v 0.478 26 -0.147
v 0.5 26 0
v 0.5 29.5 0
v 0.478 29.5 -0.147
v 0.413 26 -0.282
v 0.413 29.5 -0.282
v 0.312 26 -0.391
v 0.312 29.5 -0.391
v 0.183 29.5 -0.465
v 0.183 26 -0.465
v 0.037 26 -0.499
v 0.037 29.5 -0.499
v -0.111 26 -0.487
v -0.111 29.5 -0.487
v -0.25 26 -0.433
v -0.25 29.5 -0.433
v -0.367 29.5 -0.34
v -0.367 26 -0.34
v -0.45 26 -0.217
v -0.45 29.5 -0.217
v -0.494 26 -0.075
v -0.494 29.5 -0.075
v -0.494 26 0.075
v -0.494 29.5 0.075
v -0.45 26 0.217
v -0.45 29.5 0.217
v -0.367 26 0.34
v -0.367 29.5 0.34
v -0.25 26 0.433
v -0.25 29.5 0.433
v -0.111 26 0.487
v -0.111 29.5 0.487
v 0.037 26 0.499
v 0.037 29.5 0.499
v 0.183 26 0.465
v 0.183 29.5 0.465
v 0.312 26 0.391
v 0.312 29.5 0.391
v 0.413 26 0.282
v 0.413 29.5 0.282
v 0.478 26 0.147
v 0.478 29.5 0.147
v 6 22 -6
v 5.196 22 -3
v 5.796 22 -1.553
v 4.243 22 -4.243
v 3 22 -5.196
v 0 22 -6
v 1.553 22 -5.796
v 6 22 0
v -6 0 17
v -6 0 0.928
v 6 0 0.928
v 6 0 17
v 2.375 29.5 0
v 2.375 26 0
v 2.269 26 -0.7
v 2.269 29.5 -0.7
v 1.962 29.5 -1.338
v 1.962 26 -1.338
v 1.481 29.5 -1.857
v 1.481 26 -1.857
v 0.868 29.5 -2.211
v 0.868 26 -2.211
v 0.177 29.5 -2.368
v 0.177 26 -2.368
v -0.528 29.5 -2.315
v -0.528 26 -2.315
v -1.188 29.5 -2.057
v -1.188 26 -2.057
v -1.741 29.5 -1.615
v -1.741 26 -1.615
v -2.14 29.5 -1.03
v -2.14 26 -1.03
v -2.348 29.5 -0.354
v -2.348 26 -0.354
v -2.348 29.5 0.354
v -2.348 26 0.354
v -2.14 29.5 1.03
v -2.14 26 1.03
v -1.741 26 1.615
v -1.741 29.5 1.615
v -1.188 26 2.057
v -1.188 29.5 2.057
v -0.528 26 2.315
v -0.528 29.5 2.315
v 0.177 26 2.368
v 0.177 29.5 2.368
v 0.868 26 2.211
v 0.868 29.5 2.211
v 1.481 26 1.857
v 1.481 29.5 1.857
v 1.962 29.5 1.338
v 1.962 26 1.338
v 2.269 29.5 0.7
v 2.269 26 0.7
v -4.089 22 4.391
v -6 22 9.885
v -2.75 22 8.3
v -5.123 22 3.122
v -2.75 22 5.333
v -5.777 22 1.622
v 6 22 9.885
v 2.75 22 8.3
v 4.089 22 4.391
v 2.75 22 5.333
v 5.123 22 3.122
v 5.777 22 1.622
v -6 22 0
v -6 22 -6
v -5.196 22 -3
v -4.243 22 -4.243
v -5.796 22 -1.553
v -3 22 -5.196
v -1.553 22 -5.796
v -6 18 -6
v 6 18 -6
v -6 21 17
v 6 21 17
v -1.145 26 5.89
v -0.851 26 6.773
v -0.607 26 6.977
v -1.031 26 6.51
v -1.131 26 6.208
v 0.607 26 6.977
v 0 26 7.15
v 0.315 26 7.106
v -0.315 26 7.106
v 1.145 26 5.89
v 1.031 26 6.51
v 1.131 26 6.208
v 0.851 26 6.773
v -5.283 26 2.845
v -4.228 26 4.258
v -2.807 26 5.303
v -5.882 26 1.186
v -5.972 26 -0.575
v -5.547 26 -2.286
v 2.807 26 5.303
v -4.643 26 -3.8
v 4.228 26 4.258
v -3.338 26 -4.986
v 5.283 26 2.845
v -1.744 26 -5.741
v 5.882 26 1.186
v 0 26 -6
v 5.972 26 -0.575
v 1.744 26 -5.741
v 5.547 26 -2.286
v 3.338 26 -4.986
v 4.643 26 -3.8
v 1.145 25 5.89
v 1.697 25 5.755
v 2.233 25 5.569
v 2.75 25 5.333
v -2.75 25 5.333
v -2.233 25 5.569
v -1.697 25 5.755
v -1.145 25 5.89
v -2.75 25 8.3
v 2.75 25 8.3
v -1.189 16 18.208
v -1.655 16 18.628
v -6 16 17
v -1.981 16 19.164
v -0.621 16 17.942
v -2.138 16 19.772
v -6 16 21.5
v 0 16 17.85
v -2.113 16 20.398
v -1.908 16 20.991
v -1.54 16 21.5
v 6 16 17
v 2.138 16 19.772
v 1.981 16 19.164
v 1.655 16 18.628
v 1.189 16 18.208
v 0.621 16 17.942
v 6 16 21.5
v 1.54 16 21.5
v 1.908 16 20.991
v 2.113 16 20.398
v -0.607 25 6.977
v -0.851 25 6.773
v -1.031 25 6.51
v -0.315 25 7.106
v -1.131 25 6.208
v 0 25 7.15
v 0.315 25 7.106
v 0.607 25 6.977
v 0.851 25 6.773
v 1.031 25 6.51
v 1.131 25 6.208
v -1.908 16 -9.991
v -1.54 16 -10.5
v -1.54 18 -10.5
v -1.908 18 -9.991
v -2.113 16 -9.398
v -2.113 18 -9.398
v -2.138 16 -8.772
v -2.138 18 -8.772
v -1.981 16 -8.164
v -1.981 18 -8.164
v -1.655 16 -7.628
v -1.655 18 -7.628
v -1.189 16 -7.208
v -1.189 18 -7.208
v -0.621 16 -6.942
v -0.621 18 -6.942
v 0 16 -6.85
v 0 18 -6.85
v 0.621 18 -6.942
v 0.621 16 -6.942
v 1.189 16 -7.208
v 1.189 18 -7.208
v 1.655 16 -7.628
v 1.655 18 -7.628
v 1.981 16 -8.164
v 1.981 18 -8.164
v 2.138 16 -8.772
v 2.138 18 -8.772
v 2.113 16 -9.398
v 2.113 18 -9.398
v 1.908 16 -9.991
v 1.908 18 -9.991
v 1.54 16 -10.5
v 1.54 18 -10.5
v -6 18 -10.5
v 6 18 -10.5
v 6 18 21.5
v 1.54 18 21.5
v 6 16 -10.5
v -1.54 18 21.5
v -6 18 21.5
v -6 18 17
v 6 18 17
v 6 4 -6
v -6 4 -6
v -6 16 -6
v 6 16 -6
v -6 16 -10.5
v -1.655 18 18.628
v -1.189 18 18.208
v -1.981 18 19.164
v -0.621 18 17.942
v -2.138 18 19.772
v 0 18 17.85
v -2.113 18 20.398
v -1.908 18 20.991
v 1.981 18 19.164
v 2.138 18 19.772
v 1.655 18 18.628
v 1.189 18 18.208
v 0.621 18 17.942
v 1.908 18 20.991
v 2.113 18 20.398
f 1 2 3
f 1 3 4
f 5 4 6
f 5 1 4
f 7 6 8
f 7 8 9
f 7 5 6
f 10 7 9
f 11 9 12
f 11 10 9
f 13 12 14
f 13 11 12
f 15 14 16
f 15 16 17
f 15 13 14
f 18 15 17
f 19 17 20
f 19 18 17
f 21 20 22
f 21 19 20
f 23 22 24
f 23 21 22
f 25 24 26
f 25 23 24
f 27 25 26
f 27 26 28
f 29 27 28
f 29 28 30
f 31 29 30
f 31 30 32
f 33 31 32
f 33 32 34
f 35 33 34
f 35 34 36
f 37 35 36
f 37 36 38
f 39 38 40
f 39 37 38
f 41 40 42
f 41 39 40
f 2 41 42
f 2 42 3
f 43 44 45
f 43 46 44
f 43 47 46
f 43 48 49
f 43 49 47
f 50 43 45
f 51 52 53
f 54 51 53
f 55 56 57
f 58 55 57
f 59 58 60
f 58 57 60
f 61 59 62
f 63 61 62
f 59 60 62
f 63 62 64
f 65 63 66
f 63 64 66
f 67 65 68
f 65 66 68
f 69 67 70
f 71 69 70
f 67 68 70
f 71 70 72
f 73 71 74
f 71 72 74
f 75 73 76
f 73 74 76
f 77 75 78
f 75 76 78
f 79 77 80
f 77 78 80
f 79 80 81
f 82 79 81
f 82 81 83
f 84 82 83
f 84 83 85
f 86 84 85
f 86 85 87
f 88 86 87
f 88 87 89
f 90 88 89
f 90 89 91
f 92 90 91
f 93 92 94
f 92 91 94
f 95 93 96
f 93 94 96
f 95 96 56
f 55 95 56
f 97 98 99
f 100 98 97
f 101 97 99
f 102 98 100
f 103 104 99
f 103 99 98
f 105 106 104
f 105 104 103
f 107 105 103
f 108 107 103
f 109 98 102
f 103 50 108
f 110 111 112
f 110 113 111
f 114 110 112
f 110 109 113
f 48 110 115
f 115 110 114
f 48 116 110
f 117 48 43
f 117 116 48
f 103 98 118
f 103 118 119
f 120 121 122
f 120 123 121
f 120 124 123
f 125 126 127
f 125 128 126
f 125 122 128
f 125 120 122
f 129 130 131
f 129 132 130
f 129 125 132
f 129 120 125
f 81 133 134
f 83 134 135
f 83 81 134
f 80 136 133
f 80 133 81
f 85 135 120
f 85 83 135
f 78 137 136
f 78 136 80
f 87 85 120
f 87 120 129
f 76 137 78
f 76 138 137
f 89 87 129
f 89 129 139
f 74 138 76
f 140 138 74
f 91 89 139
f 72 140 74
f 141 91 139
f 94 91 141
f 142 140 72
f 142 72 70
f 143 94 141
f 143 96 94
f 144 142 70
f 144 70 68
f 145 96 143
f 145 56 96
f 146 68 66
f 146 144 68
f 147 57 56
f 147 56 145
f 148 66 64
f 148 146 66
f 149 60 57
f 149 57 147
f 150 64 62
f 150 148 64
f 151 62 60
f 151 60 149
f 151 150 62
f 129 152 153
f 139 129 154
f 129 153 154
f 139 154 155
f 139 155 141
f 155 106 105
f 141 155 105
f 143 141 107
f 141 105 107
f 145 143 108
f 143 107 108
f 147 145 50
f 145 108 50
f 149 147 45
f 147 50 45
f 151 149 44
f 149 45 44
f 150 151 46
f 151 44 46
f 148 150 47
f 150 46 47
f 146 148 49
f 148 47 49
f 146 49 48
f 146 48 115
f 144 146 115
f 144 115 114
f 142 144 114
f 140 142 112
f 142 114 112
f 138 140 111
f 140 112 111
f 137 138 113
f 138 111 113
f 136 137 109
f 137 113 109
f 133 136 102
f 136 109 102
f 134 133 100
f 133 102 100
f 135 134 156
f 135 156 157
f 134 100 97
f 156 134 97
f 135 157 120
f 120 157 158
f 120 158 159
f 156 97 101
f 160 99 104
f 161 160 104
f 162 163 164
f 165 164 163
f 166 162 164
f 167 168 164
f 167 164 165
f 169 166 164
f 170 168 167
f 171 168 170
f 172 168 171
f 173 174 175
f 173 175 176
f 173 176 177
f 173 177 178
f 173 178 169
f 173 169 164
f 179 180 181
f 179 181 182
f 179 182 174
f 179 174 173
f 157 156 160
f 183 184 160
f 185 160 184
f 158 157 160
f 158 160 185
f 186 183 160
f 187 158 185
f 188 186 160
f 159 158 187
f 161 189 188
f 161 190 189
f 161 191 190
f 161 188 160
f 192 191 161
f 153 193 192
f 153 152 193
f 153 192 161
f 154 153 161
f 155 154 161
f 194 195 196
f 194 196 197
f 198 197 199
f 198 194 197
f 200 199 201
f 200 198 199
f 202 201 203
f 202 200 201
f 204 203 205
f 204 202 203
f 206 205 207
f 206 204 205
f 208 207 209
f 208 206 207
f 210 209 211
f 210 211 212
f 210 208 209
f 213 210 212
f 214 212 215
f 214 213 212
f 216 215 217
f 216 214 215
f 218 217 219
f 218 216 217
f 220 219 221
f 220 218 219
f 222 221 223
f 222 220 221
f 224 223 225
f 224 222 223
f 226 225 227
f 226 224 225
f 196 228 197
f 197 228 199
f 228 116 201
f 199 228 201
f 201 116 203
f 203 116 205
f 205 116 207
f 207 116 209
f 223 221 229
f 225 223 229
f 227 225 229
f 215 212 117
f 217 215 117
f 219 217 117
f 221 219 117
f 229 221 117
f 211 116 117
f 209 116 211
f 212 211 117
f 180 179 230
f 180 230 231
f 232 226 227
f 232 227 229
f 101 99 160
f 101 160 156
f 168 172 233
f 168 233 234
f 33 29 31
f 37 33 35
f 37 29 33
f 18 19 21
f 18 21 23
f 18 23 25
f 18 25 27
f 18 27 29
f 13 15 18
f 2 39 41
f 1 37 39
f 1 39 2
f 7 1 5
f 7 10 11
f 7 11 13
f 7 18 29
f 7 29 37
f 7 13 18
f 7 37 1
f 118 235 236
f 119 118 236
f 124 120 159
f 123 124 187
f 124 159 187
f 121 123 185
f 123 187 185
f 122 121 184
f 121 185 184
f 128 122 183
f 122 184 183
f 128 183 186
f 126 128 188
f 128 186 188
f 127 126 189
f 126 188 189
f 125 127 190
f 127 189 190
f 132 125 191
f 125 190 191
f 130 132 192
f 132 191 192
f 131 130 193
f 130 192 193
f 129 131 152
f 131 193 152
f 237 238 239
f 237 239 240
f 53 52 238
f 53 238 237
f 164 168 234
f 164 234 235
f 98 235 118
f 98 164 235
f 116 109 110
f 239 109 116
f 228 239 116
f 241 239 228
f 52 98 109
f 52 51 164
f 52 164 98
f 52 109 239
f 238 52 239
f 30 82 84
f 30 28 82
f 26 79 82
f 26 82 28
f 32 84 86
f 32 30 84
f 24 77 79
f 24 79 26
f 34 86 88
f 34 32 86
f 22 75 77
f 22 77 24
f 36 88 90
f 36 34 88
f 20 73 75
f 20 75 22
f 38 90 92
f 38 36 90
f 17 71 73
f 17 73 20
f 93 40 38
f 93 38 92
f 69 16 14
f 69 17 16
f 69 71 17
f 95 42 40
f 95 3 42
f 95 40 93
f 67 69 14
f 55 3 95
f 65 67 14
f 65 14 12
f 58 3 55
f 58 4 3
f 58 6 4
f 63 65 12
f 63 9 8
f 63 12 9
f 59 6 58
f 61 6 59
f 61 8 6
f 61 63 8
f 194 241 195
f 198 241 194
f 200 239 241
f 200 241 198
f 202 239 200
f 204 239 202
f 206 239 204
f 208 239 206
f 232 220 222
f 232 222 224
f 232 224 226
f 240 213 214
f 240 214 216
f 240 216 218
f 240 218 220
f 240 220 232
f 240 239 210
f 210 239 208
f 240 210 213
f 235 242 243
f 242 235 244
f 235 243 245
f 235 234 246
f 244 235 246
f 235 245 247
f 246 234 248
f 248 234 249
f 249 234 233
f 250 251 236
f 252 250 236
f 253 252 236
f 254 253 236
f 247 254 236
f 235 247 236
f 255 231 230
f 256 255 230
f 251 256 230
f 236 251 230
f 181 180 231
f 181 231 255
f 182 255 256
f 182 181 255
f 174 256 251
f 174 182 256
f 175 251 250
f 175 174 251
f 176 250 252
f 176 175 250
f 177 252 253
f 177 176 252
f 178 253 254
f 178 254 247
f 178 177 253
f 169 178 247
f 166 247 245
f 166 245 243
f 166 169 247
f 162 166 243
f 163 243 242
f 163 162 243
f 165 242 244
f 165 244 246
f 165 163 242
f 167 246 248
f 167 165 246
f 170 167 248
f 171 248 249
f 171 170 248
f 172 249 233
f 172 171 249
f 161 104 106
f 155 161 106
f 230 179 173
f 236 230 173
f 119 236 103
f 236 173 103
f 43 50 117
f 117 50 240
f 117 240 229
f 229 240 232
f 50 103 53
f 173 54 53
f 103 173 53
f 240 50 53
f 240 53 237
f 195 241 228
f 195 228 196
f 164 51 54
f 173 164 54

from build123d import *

# Parameters (mm, degrees)
SKETCH1_W           = 12
SKETCH1_H           = 23
BOSS_EXTRUDE1_DEPTH = 22
CHAMFER1_SIZE       = 4
CHAMFER1_SIZE2      = 6.92820323
BOSS_EXTRUDE2_DEPTH = 2
SKETCH3_R           = 6
BOSS_EXTRUDE3_DEPTH = 4
SKETCH4_W           = 5.5
SKETCH4_H           = 8.3
BOSS_EXTRUDE4_DEPTH = 3
SKETCH5_R           = 1.15
BOSS_EXTRUDE5_DEPTH = 1
SKETCH6_R           = 2.375
SKETCH6_R_2         = 0.5
BOSS_EXTRUDE6_DEPTH = 3.5
CHAMFER2_SIZE       = 1
CHAMFER2_SIZE2      = 7.115369722


with BuildPart() as part:
    # Sketch1 → Boss-Extrude1 (new body)
    with BuildSketch(Plane(origin=(0, 0, 0), x_dir=(1, 0, 0), z_dir=(0, 1, 0))):
        with Locations((0, -5.5)):
            Rectangle(SKETCH1_W, SKETCH1_H)
    extrude(amount=BOSS_EXTRUDE1_DEPTH)

    # Chamfer1
    chamfer1_edges = [part.edges().sort_by_distance(p)[0] for p in [
        (0, 0, -6),
    ]]
    chamfer1_side = [part.faces().sort_by_distance(p)[0] for p in [
        (0, 11, -6),
    ]]
    chamfer(chamfer1_edges, length=CHAMFER1_SIZE, length2=CHAMFER1_SIZE2, reference=chamfer1_side[0])

    # Sketch2 → Boss-Extrude2 (add)
    with BuildSketch(Plane(origin=(0, 16, 0), x_dir=(-1, 0, 0), z_dir=(0, 1, 0))):
        with BuildLine():
            Line((6, -6), (6, -10.5))
            Line((6, -10.5), (1.54029218, -10.5))
            ThreePointArc((1.54029218, -10.5), (0, -6.85), (-1.54029218, -10.5))
            Line((-1.54029218, -10.5), (-6, -10.5))
            Line((-6, -10.5), (-6, -6))
            Line((-6, -6), (6, -6))
        make_face()
        with BuildLine():
            Line((-6, 21.5), (-1.54029218, 21.5))
            ThreePointArc((-1.54029218, 21.5), (0, 17.85), (1.54029218, 21.5))
            Line((1.54029218, 21.5), (6, 21.5))
            Line((6, 21.5), (6, 17))
            Line((6, 17), (-6, 17))
            Line((-6, 17), (-6, 21.5))
        make_face()
    extrude(amount=BOSS_EXTRUDE2_DEPTH)

    # Sketch3 → Boss-Extrude3 (add)
    with BuildSketch(Plane(origin=(0, 22, 0), x_dir=(1, 0, 0), z_dir=(0, 1, 0))):
        Circle(SKETCH3_R)
    extrude(amount=BOSS_EXTRUDE3_DEPTH)

    # Sketch4 → Boss-Extrude4 (add)
    with BuildSketch(Plane(origin=(0, 22, 0), x_dir=(1, 0, 0), z_dir=(0, 1, 0))):
        with Locations((0, -4.15)):
            Rectangle(SKETCH4_W, SKETCH4_H)
    extrude(amount=BOSS_EXTRUDE4_DEPTH)

    # Sketch5 → Boss-Extrude5 (add)
    with BuildSketch(Plane(origin=(0, 25, 0), x_dir=(1, 0, 0), z_dir=(0, 1, 0))):
        with Locations((0, -6)):
            Circle(SKETCH5_R)
    extrude(amount=BOSS_EXTRUDE5_DEPTH)

    # Sketch6 → Boss-Extrude6 (add)
    with BuildSketch(Plane(origin=(0, 26, 0), x_dir=(1, 0, 0), z_dir=(0, 1, 0))):
        Circle(SKETCH6_R)
        Circle(SKETCH6_R_2, mode=Mode.SUBTRACT)
    extrude(amount=BOSS_EXTRUDE6_DEPTH)

    # Chamfer2
    chamfer2_edges = [part.edges().sort_by_distance(p)[0] for p in [
        (0, 22, 17),
    ]]
    chamfer2_side = [part.faces().sort_by_distance(p)[0] for p in [
        (0, 20, 17),
    ]]
    chamfer(chamfer2_edges, length=CHAMFER2_SIZE, length2=CHAMFER2_SIZE2, reference=chamfer2_side[0])


solid = part.part
